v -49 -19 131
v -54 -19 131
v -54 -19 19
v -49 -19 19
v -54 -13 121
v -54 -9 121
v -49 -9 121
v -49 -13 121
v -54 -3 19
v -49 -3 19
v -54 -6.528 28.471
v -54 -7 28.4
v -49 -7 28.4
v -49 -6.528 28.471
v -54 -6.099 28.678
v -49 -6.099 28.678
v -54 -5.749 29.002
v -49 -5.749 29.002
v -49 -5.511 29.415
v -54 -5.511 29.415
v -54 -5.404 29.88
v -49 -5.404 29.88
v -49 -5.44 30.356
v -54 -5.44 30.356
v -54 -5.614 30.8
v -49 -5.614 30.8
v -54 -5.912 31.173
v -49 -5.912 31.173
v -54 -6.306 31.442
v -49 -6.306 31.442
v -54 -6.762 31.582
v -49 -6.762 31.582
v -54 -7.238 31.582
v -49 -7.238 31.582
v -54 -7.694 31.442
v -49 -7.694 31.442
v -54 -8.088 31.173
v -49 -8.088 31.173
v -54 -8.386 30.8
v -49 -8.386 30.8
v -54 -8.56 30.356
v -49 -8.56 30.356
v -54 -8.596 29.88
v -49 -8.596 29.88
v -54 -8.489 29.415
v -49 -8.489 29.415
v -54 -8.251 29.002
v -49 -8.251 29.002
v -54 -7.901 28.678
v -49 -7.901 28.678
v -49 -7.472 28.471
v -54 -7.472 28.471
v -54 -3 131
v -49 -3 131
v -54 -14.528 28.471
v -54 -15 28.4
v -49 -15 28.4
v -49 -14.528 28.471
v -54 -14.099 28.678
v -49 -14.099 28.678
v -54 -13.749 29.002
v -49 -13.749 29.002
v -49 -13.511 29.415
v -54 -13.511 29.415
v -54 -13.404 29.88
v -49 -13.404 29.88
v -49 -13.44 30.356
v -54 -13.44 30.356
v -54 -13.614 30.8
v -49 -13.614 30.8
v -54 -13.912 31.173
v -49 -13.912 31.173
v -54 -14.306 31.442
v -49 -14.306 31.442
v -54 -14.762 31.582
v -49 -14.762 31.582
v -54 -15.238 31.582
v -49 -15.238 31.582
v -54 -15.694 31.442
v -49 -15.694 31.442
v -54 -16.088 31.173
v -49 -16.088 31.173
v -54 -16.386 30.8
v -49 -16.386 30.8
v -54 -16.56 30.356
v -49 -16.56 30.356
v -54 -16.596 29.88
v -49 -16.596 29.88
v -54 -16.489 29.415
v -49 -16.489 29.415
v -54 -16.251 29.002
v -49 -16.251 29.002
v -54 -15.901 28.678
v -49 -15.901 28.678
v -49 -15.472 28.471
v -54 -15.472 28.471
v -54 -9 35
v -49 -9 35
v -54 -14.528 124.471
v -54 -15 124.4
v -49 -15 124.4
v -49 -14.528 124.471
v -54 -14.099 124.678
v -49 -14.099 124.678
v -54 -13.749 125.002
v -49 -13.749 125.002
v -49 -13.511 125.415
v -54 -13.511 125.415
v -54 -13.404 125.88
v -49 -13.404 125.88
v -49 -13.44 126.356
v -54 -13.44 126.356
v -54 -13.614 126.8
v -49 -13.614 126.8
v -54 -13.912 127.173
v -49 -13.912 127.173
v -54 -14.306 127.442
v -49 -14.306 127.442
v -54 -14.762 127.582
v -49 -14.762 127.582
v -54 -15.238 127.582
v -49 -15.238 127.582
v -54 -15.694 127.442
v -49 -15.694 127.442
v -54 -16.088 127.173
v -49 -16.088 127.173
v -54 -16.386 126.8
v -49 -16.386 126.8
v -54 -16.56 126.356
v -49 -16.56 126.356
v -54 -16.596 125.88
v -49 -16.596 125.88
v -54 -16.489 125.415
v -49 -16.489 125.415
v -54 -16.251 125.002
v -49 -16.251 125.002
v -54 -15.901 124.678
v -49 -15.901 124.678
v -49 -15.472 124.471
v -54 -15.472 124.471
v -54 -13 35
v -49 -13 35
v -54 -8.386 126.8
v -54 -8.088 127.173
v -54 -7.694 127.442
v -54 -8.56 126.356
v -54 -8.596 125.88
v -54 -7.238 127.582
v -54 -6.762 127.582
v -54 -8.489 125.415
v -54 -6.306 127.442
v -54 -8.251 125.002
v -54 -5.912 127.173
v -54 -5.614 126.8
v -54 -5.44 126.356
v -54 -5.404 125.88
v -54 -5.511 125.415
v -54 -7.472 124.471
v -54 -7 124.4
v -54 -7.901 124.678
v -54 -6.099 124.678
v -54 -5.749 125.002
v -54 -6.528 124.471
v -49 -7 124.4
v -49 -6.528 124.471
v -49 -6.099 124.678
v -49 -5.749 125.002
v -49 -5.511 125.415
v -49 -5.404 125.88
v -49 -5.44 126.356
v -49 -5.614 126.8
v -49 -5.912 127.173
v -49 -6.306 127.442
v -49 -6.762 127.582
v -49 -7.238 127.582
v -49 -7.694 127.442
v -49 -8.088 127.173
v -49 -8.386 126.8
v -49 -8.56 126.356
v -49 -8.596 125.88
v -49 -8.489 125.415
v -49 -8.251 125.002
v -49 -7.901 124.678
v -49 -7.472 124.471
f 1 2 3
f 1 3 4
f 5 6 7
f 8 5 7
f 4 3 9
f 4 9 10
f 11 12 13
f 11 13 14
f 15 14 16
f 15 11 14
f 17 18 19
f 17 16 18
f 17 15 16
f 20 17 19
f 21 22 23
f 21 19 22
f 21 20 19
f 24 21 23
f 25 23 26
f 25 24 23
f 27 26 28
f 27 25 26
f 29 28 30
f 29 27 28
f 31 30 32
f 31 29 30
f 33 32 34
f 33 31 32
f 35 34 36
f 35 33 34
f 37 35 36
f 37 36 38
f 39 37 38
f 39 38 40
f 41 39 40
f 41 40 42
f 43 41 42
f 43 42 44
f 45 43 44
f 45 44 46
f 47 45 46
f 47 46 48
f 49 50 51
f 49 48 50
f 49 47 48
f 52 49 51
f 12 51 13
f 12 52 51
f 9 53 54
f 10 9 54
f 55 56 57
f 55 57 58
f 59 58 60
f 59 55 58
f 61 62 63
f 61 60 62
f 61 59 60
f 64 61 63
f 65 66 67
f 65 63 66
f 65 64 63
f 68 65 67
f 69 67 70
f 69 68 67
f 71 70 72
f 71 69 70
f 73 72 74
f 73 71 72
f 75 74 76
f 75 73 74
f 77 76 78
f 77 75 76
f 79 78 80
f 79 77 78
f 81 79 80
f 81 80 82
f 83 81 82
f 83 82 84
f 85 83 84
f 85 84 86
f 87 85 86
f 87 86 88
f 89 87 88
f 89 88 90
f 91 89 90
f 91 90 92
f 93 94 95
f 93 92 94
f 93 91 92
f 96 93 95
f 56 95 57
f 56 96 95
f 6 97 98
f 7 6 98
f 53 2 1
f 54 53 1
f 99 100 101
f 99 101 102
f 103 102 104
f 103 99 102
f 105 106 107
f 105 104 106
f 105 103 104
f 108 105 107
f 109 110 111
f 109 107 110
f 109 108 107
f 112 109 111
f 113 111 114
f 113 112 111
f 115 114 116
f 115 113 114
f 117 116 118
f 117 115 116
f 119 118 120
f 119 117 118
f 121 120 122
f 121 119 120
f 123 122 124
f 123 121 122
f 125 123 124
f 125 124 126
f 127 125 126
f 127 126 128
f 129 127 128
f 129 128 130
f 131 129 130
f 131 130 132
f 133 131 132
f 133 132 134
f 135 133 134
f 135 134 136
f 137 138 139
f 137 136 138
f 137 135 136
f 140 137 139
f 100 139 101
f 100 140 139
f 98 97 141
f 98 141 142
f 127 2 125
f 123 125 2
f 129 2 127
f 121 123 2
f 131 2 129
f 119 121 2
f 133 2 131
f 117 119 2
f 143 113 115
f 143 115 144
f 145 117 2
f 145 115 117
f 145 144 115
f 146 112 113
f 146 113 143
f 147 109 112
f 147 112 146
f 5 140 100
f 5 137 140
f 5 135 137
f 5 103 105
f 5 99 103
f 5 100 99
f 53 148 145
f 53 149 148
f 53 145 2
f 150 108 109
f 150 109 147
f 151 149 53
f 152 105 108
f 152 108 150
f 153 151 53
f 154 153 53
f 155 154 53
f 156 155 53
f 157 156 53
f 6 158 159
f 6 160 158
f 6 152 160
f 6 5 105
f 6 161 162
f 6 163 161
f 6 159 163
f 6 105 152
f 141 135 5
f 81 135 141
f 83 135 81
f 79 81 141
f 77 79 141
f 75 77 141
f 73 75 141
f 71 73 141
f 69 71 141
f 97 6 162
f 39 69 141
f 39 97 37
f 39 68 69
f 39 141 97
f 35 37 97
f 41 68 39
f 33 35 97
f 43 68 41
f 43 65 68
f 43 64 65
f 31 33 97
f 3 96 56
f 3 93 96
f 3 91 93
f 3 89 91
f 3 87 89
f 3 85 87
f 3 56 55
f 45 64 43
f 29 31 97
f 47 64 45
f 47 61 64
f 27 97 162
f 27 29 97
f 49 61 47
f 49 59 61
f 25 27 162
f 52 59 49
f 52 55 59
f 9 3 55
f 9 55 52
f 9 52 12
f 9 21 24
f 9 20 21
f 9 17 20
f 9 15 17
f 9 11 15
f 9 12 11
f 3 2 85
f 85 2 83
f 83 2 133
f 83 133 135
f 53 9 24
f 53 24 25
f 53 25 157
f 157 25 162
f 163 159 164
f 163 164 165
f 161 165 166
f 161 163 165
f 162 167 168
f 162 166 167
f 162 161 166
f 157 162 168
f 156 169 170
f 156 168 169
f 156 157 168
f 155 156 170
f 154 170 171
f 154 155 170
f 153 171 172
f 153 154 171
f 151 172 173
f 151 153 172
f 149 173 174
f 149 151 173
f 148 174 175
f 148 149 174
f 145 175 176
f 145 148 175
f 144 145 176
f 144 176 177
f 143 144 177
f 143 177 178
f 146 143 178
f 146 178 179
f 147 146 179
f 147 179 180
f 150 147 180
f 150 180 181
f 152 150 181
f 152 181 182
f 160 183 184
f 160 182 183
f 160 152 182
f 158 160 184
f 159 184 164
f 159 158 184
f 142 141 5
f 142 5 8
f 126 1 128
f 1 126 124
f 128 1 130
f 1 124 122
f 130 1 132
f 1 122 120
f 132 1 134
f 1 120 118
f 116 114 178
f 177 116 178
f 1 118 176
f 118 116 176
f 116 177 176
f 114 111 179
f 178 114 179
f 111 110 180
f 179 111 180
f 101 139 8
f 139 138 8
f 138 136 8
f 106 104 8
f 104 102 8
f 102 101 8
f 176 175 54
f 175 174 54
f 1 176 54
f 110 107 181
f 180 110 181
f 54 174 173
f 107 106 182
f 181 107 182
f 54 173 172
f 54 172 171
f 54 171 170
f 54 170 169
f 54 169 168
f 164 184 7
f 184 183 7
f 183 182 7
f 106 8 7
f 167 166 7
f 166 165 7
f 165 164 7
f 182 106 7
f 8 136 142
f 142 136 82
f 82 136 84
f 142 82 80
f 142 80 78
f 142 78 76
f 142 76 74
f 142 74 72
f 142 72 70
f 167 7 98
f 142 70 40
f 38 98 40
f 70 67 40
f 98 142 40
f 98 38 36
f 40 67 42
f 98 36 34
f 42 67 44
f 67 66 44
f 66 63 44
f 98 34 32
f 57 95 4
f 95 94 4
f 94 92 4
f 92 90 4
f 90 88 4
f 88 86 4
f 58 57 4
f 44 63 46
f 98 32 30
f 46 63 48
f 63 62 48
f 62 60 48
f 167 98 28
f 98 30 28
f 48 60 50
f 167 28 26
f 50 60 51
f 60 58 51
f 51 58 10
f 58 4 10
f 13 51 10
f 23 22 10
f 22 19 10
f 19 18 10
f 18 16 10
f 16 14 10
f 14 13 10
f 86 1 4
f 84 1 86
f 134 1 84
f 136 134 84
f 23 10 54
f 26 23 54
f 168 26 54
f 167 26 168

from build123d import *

# Parameters (mm, degrees)
CYLINDER075_R           = 1.6
CYLINDER075_DEPTH       = 40
CYLINDER075_PITCH_ANGLE = 90
CYLINDER065_R           = 1.6
CYLINDER065_DEPTH       = 40
CYLINDER065_PITCH_ANGLE = 90
CYLINDER064_R           = 1.6
CYLINDER064_DEPTH       = 40
CYLINDER064_PITCH_ANGLE = 90
CYLINDER074_R           = 1.6
CYLINDER074_DEPTH       = 40
CYLINDER074_PITCH_ANGLE = 90
CYLINDER072_R           = 1.6
CYLINDER072_DEPTH       = 40
CYLINDER072_PITCH_ANGLE = 90
CYLINDER071_R           = 1.6
CYLINDER071_DEPTH       = 40
CYLINDER071_PITCH_ANGLE = 90
BOX021_W                = 10
BOX021_H                = 4
BOX021_DEPTH            = 86
BOX020_W                = 5
BOX020_H                = 16
BOX020_DEPTH            = 112


with BuildPart() as cylinder353:
    # Cylinder075 → Cylinder075 (new body)
    with BuildSketch(Plane.XY):
        Circle(CYLINDER075_R)
    extrude(amount=CYLINDER075_DEPTH)


with BuildPart() as cylinder353_1:
    # Cylinder075 pitch: moved
    add(cylinder353.part.rotate(Axis((0, 0, 0), (0, 1, 0)), CYLINDER075_PITCH_ANGLE))


with BuildPart() as cylinder353_2:
    # Cylinder075 placement: moved
    add(cylinder353_1.part.moved(Location((-67, 7, 126))))


with BuildPart() as cylinder343:
    # Cylinder065 → Cylinder065 (new body)
    with BuildSketch(Plane.XY):
        Circle(CYLINDER065_R)
    extrude(amount=CYLINDER065_DEPTH)


with BuildPart() as cylinder343_1:
    # Cylinder065 pitch: moved
    add(cylinder343.part.rotate(Axis((0, 0, 0), (0, 1, 0)), CYLINDER065_PITCH_ANGLE))


with BuildPart() as cylinder343_2:
    # Cylinder065 placement: moved
    add(cylinder343_1.part.moved(Location((-67, -15, 30))))


with BuildPart() as rocker_screw_holes_d:
    # Cylinder064 → Cylinder064 (new body)
    with BuildSketch(Plane.XY):
        Circle(CYLINDER064_R)
    extrude(amount=CYLINDER064_DEPTH)


with BuildPart() as rocker_screw_holes_d_1:
    # Cylinder064 pitch: moved
    add(rocker_screw_holes_d.part.rotate(Axis((0, 0, 0), (0, 1, 0)), CYLINDER064_PITCH_ANGLE))


with BuildPart() as rocker_screw_holes_d_2:
    # Cylinder064 placement: moved
    add(rocker_screw_holes_d_1.part.moved(Location((-87, -7, 30))))

    # Fusion042: union Cylinder343
    add(cylinder343_2.part)


with BuildPart() as rocker_screw_holes_d_3:
    # Fusion042 placement: moved
    add(rocker_screw_holes_d_2.part.moved(Location((0, 0, 96))))

    # Fusion050: union Cylinder353
    add(cylinder353_2.part)


with BuildPart() as cylinder352:
    # Cylinder074 → Cylinder074 (new body)
    with BuildSketch(Plane.XY):
        Circle(CYLINDER074_R)
    extrude(amount=CYLINDER074_DEPTH)


with BuildPart() as cylinder352_1:
    # Cylinder074 pitch: moved
    add(cylinder352.part.rotate(Axis((0, 0, 0), (0, 1, 0)), CYLINDER074_PITCH_ANGLE))


with BuildPart() as cylinder352_2:
    # Cylinder074 placement: moved
    add(cylinder352_1.part.moved(Location((-67, 7, 30))))


with BuildPart() as cylinder350:
    # Cylinder072 → Cylinder072 (new body)
    with BuildSketch(Plane.XY):
        Circle(CYLINDER072_R)
    extrude(amount=CYLINDER072_DEPTH)


with BuildPart() as cylinder350_1:
    # Cylinder072 pitch: moved
    add(cylinder350.part.rotate(Axis((0, 0, 0), (0, 1, 0)), CYLINDER072_PITCH_ANGLE))


with BuildPart() as cylinder350_2:
    # Cylinder072 placement: moved
    add(cylinder350_1.part.moved(Location((-67, -15, 30))))


with BuildPart() as rocker_screw_holes_c:
    # Cylinder071 → Cylinder071 (new body)
    with BuildSketch(Plane.XY):
        Circle(CYLINDER071_R)
    extrude(amount=CYLINDER071_DEPTH)


with BuildPart() as rocker_screw_holes_c_1:
    # Cylinder071 pitch: moved
    add(rocker_screw_holes_c.part.rotate(Axis((0, 0, 0), (0, 1, 0)), CYLINDER071_PITCH_ANGLE))


with BuildPart() as rocker_screw_holes_c_2:
    # Cylinder071 placement: moved
    add(rocker_screw_holes_c_1.part.moved(Location((-87, -7, 30))))

    # Fusion047: union Cylinder350
    add(cylinder350_2.part)

    # Fusion049: union Cylinder352
    add(cylinder352_2.part)


with BuildPart() as string_hole001:
    # Box021 → Box021 (new body)
    with BuildSketch(Plane(origin=(-46, -13, 35), x_dir=(1, 0, 0), z_dir=(0, 0, 1))):
        with Locations((5, 2)):
            Rectangle(BOX021_W, BOX021_H)
    extrude(amount=BOX021_DEPTH)


with BuildPart() as string_slot_c:
    # Box020 → Box020 (new body)
    with BuildSketch(Plane(origin=(-43, -19, 19), x_dir=(1, 0, 0), z_dir=(0, 0, 1))):
        with Locations((2.5, 8)):
            Rectangle(BOX020_W, BOX020_H)
    extrude(amount=BOX020_DEPTH)

    # Cut031: cut string-hole001
    add(string_hole001.part, mode=Mode.SUBTRACT)


with BuildPart() as string_slot_c_1:
    # Cut031 placement: moved
    add(string_slot_c.part.moved(Location((-11, 0, 0))))

    # Cut041: cut rocker-screw-holes-c
    add(rocker_screw_holes_c_2.part, mode=Mode.SUBTRACT)

    # Cut042: cut rocker-screw-holes-d
    add(rocker_screw_holes_d_3.part, mode=Mode.SUBTRACT)


solid = string_slot_c_1.part
